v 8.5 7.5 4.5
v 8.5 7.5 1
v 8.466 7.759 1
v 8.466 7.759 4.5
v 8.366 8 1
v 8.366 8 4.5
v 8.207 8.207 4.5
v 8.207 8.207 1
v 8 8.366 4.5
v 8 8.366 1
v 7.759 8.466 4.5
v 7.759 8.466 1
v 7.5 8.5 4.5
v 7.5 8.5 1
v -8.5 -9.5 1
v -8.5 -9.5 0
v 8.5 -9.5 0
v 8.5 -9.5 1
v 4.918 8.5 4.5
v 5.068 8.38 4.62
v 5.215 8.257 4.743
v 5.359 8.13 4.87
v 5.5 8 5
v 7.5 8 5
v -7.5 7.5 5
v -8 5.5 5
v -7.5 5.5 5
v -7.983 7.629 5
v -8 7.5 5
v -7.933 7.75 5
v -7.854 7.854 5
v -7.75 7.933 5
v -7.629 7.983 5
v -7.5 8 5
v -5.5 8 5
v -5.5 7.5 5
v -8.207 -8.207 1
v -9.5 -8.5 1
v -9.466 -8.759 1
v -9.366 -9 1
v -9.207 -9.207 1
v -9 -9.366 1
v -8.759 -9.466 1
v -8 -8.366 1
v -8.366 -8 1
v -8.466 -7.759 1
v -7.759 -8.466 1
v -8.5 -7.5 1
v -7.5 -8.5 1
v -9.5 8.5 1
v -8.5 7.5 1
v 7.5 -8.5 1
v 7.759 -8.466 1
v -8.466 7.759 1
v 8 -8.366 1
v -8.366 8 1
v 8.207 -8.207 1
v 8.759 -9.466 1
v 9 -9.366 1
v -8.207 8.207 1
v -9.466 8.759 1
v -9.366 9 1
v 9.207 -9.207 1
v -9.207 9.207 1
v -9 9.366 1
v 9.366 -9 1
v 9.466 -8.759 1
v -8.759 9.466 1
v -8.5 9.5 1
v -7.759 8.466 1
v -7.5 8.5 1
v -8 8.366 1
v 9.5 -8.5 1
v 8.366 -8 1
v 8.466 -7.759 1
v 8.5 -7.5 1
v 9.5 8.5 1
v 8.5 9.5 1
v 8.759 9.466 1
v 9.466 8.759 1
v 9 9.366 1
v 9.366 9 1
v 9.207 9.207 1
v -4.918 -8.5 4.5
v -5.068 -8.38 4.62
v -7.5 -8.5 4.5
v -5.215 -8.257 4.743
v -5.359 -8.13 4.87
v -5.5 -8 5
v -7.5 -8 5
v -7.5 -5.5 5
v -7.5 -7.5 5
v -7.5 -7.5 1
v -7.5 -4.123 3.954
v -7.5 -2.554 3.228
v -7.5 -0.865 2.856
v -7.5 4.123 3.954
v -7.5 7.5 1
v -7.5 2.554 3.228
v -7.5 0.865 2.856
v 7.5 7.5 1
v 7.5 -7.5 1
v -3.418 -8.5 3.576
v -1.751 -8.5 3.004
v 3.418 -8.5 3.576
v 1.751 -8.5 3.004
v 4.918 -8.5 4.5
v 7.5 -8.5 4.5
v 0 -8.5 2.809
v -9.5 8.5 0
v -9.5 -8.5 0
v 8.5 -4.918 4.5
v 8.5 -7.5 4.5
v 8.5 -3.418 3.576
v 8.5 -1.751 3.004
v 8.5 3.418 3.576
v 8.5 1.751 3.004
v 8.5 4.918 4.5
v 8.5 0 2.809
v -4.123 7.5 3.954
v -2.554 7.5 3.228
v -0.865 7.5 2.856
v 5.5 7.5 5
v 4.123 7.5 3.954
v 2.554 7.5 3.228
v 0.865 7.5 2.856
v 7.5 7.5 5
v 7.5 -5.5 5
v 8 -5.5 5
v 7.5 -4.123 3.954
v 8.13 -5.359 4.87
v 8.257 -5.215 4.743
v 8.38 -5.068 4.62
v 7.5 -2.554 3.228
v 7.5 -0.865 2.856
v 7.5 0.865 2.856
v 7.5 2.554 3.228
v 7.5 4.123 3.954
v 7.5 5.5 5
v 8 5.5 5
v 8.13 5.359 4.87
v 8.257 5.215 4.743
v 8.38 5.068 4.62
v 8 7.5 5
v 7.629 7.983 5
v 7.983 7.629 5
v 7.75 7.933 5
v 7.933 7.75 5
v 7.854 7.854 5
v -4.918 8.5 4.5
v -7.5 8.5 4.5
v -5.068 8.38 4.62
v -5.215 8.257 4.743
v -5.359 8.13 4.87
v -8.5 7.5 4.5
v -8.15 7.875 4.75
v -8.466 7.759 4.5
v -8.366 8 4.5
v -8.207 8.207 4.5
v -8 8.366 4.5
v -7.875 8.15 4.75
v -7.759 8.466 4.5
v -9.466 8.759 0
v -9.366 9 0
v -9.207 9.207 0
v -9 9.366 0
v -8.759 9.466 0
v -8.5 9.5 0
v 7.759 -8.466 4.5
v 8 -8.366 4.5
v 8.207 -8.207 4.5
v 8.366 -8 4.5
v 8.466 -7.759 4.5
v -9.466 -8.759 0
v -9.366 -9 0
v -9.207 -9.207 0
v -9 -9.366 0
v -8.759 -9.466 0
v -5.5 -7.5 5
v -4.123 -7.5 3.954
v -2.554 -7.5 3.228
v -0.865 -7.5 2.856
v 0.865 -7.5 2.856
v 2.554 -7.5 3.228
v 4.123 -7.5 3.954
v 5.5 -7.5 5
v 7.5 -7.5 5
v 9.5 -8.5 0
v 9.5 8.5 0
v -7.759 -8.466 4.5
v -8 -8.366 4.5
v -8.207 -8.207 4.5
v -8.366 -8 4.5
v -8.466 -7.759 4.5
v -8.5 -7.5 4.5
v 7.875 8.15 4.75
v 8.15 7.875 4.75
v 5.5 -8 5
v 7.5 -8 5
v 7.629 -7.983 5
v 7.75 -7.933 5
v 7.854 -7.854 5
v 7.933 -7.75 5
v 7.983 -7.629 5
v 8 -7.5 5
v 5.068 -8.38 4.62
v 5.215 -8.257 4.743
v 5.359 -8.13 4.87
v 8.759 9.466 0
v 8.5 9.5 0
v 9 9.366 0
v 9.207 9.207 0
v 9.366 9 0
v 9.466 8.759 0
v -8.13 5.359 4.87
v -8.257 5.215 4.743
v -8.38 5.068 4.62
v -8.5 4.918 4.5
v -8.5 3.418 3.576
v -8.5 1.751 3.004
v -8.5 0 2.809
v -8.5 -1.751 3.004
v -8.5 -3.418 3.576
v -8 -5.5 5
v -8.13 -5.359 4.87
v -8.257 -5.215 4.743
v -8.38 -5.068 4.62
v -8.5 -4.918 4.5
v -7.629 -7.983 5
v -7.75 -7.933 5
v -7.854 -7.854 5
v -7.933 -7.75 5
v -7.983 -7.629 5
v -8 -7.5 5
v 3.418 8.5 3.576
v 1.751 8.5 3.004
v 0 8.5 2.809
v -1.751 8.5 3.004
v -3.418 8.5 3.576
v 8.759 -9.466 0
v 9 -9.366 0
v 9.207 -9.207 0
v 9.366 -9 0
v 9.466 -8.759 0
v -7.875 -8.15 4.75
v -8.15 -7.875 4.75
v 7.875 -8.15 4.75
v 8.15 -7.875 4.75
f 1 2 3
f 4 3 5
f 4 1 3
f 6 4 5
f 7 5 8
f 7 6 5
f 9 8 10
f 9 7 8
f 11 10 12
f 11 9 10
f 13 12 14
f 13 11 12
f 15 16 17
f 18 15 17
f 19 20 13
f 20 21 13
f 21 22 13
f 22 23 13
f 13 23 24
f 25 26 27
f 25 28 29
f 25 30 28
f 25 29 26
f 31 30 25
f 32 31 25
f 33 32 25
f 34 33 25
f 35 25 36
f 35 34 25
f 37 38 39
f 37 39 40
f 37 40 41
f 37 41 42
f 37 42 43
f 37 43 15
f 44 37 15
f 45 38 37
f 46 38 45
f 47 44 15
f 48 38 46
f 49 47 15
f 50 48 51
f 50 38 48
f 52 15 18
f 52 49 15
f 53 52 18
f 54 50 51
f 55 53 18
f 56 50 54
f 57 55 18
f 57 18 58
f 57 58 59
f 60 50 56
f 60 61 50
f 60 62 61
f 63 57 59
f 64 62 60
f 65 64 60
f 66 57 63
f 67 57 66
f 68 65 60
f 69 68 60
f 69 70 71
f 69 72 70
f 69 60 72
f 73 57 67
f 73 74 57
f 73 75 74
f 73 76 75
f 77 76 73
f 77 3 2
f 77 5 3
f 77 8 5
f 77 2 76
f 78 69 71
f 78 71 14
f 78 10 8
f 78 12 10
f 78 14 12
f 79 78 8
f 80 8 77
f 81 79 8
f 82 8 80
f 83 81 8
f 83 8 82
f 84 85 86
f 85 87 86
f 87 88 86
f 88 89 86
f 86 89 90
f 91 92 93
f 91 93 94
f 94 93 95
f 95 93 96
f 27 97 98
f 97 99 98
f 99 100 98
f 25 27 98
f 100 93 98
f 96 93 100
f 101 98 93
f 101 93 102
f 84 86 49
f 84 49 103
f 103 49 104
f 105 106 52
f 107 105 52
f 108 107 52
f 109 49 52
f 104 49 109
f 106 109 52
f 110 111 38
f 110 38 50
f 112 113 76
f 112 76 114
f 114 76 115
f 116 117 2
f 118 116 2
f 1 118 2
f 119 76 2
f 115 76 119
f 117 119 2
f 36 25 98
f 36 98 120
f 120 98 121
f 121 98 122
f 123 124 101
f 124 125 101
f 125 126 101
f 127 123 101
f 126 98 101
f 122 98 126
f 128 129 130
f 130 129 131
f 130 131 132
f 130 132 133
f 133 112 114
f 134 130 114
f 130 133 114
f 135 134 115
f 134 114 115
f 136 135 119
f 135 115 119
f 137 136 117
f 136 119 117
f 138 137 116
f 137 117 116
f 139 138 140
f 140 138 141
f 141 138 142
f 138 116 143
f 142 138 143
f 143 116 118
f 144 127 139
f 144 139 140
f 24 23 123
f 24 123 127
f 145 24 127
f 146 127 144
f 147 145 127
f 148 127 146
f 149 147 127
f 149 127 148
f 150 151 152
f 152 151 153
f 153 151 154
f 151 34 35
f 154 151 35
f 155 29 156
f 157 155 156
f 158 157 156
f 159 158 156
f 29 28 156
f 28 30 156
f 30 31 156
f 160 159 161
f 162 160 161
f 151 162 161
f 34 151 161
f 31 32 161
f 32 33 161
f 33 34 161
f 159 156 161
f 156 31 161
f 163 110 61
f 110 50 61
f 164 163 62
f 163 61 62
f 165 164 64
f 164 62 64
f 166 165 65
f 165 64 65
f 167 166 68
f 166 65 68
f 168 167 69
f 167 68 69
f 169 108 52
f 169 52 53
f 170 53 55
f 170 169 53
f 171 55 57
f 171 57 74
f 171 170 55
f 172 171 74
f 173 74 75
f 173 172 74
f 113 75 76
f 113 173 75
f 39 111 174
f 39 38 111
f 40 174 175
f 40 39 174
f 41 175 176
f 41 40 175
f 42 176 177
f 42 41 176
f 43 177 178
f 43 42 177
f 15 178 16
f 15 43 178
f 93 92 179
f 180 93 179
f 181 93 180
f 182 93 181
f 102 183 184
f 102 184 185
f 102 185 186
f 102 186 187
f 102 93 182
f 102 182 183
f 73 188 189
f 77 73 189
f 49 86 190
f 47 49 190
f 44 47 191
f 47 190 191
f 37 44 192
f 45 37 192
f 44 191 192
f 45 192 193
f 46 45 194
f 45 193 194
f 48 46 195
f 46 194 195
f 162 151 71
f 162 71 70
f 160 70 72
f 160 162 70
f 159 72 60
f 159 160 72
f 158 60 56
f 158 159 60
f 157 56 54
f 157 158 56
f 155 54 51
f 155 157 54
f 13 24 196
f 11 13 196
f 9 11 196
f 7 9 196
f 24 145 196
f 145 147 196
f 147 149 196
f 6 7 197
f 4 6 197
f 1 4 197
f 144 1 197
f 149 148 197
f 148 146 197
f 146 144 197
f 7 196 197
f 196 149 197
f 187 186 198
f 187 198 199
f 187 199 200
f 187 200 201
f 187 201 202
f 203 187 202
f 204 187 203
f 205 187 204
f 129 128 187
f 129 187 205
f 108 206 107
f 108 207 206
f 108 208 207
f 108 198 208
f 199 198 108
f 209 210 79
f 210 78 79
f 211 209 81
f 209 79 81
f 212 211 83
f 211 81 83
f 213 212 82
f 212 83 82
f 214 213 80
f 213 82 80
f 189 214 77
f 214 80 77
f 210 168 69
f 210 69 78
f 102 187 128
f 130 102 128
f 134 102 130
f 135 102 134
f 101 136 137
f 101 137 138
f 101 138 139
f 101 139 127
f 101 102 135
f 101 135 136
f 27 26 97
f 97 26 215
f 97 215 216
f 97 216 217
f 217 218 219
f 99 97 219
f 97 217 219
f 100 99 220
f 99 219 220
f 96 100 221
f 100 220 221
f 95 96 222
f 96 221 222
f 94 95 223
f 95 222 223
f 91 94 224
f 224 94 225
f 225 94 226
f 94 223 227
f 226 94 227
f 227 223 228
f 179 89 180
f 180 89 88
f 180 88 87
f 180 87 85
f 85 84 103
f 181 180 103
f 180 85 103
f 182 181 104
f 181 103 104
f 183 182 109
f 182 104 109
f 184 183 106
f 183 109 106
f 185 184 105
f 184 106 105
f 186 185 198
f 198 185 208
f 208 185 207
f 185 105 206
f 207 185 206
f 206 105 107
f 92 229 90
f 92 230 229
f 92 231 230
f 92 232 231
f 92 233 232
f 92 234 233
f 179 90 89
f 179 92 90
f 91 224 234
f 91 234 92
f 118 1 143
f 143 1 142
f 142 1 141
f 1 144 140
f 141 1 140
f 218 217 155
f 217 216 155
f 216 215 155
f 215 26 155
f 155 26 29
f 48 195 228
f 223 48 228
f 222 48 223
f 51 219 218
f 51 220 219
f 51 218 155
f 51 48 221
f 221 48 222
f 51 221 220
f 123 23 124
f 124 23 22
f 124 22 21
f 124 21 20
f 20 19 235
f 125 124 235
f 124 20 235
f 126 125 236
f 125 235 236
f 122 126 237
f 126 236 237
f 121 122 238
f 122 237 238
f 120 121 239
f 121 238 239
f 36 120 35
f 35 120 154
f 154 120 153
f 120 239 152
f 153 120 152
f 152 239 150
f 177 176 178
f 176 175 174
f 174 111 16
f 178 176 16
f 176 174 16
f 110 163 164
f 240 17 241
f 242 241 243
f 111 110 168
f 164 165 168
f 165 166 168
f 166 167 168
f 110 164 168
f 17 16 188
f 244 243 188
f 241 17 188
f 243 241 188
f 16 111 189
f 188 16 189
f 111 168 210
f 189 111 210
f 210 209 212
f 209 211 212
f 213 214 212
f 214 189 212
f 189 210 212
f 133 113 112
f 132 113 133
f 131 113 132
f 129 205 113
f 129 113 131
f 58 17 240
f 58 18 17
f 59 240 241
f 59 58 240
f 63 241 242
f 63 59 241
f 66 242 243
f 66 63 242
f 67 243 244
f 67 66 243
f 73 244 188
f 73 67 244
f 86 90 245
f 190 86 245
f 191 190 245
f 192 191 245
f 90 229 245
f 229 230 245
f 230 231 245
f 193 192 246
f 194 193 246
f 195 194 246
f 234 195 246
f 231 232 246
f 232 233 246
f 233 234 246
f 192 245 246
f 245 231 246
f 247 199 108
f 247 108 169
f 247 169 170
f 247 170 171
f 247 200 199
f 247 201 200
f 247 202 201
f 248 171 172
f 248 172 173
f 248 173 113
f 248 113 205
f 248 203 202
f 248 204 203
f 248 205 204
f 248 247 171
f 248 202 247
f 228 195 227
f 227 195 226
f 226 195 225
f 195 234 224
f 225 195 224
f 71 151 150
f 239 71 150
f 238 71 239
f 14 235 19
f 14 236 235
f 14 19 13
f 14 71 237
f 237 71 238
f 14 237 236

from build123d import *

# Parameters (mm, degrees)
F0_W            = 19
F0_H            = 19
F1_DEPTH        = 1
F2_W            = 17
F2_H            = 17
F3_DEPTH        = 4
F4_T            = 1
F4_T3_DEPTH     = 19
F4_T5_DEPTH     = 19
F6_DEPTH        = 2
F6_COPIES_COUNT = 4
F8_R            = 1
F9_SIZE         = 0.5


# Not quite as in the source:
# - a pattern or mirror of a feature is missing from the dataset's text; its kind, count and spacing are read off the source's solid
# - a shell that OpenCascade refuses in one call is made with other operations: the cavity is built on its own and cut out


with BuildPart() as f1:
    # F0 (on Top) → F1 (new body)
    with BuildSketch(Plane.XY):
        Rectangle(F0_W, F0_H)
    extrude(amount=F1_DEPTH)

    # F2 (on face) → F3 (join)
    with BuildSketch(Plane.XY.offset(1)):
        Rectangle(F2_W, F2_H)
    extrude(amount=F3_DEPTH)

    # F4: shell of thickness 1, made by hand


with BuildPart() as f4_core1:
    # F4_t2: copy of F1
    add(f1.part)

    # the walls: a layer under each face that stays
    f4_faces = [f4_core1.faces().sort_by_distance(p)[0] for p in [
        (0, -9.5, 0.5),
        (-9.5, 0, 0.5),
        (9.5, 0, 0.5),
        (0, 0, 0),
        (-8.8666666667, -8.8666666667, 1),
        (0, 9.5, 0.5),
        (8.5, 0, 3),
        (0, 8.5, 3),
        (-8.5, 0, 3),
        (0, -8.5, 3),
    ]]
    thicken(f4_faces, amount=-F4_T, mode=Mode.SUBTRACT)

    # F4_s4 → F4_t3 (cut)
    with BuildSketch(Plane.XZ.offset(-9.5)):
        Polygon((8.51, 1.01), (8.5, 0), (7.5, 0), (7.5, 1), align=None)
        Polygon((-8.51, 1.01), (-8.5, 0), (-7.5, 0), (-7.5, 1), align=None)
    extrude(amount=F4_T3_DEPTH, mode=Mode.SUBTRACT)

    # F4_s6 → F4_t5 (cut)
    with BuildSketch(Plane.YZ.offset(-9.5)):
        Polygon((8.51, 1.01), (8.5, 0), (7.5, 0), (7.5, 1), align=None)
        Polygon((-8.51, 1.01), (-8.5, 0), (-7.5, 0), (-7.5, 1), align=None)
    extrude(amount=F4_T5_DEPTH, mode=Mode.SUBTRACT)


with BuildPart() as f1_1:
    add(f1.part)

    # what is left inside the walls is the cavity
    f4_cavity = [f4_core1.part.solids().sort_by_distance(p)[0] for p in [
        (0, -2.5, 1.01),
    ]]
    add(f4_cavity, mode=Mode.SUBTRACT)

    # F5 (on face) → F6 (cut)
    with BuildSketch(Plane.XZ.offset(8.5)):
        with BuildLine():
            Line((5.5, 5), (-5.5, 5))
            ThreePointArc((-5.5, 5), (0, 2.8094750193), (5.5, 5))
        make_face()
    f6 = extrude(amount=-F6_DEPTH, mode=Mode.SUBTRACT)

    # F6_copies: F6 ×4 about axis
    f6_copies_axis = Axis((0, 0, 0), (0, 0, 1))
    for i in range(1, F6_COPIES_COUNT):
        add(f6.rotate(f6_copies_axis, i * 360 / F6_COPIES_COUNT), mode=Mode.SUBTRACT)

    # F8
    f8_edges = [f1_1.edges().sort_by_distance(p)[0] for p in [
        (-8.5, -8.5, 3),
        (-9.5, -9.5, 0.5),
        (8.5, -8.5, 3),
        (9.5, -9.5, 0.5),
        (8.5, 8.5, 3),
        (9.5, 9.5, 0.5),
        (-8.5, 8.5, 3),
        (-9.5, 9.5, 0.5),
    ]]
    fillet(f8_edges, radius=F8_R)

    # F9
    f9_edges = [f1_1.edges().sort_by_distance(p)[0] for p in [
        (6.5, 8.5, 5),
        (-6.5, 8.5, 5),
        (-8.5, 6.5, 5),
        (-8.5, -6.5, 5),
        (6.5, -8.5, 5),
        (8.5, -6.5, 5),
        (8.5, 6.5, 5),
        (8.207107, -8.207107, 5),
        (8.207107, 8.207107, 5),
        (-6.5, -8.5, 5),
        (-8.207107, -8.207107, 5),
        (-8.207107, 8.207107, 5),
    ]]
    chamfer(f9_edges, length=F9_SIZE)


solid = f1_1.part
